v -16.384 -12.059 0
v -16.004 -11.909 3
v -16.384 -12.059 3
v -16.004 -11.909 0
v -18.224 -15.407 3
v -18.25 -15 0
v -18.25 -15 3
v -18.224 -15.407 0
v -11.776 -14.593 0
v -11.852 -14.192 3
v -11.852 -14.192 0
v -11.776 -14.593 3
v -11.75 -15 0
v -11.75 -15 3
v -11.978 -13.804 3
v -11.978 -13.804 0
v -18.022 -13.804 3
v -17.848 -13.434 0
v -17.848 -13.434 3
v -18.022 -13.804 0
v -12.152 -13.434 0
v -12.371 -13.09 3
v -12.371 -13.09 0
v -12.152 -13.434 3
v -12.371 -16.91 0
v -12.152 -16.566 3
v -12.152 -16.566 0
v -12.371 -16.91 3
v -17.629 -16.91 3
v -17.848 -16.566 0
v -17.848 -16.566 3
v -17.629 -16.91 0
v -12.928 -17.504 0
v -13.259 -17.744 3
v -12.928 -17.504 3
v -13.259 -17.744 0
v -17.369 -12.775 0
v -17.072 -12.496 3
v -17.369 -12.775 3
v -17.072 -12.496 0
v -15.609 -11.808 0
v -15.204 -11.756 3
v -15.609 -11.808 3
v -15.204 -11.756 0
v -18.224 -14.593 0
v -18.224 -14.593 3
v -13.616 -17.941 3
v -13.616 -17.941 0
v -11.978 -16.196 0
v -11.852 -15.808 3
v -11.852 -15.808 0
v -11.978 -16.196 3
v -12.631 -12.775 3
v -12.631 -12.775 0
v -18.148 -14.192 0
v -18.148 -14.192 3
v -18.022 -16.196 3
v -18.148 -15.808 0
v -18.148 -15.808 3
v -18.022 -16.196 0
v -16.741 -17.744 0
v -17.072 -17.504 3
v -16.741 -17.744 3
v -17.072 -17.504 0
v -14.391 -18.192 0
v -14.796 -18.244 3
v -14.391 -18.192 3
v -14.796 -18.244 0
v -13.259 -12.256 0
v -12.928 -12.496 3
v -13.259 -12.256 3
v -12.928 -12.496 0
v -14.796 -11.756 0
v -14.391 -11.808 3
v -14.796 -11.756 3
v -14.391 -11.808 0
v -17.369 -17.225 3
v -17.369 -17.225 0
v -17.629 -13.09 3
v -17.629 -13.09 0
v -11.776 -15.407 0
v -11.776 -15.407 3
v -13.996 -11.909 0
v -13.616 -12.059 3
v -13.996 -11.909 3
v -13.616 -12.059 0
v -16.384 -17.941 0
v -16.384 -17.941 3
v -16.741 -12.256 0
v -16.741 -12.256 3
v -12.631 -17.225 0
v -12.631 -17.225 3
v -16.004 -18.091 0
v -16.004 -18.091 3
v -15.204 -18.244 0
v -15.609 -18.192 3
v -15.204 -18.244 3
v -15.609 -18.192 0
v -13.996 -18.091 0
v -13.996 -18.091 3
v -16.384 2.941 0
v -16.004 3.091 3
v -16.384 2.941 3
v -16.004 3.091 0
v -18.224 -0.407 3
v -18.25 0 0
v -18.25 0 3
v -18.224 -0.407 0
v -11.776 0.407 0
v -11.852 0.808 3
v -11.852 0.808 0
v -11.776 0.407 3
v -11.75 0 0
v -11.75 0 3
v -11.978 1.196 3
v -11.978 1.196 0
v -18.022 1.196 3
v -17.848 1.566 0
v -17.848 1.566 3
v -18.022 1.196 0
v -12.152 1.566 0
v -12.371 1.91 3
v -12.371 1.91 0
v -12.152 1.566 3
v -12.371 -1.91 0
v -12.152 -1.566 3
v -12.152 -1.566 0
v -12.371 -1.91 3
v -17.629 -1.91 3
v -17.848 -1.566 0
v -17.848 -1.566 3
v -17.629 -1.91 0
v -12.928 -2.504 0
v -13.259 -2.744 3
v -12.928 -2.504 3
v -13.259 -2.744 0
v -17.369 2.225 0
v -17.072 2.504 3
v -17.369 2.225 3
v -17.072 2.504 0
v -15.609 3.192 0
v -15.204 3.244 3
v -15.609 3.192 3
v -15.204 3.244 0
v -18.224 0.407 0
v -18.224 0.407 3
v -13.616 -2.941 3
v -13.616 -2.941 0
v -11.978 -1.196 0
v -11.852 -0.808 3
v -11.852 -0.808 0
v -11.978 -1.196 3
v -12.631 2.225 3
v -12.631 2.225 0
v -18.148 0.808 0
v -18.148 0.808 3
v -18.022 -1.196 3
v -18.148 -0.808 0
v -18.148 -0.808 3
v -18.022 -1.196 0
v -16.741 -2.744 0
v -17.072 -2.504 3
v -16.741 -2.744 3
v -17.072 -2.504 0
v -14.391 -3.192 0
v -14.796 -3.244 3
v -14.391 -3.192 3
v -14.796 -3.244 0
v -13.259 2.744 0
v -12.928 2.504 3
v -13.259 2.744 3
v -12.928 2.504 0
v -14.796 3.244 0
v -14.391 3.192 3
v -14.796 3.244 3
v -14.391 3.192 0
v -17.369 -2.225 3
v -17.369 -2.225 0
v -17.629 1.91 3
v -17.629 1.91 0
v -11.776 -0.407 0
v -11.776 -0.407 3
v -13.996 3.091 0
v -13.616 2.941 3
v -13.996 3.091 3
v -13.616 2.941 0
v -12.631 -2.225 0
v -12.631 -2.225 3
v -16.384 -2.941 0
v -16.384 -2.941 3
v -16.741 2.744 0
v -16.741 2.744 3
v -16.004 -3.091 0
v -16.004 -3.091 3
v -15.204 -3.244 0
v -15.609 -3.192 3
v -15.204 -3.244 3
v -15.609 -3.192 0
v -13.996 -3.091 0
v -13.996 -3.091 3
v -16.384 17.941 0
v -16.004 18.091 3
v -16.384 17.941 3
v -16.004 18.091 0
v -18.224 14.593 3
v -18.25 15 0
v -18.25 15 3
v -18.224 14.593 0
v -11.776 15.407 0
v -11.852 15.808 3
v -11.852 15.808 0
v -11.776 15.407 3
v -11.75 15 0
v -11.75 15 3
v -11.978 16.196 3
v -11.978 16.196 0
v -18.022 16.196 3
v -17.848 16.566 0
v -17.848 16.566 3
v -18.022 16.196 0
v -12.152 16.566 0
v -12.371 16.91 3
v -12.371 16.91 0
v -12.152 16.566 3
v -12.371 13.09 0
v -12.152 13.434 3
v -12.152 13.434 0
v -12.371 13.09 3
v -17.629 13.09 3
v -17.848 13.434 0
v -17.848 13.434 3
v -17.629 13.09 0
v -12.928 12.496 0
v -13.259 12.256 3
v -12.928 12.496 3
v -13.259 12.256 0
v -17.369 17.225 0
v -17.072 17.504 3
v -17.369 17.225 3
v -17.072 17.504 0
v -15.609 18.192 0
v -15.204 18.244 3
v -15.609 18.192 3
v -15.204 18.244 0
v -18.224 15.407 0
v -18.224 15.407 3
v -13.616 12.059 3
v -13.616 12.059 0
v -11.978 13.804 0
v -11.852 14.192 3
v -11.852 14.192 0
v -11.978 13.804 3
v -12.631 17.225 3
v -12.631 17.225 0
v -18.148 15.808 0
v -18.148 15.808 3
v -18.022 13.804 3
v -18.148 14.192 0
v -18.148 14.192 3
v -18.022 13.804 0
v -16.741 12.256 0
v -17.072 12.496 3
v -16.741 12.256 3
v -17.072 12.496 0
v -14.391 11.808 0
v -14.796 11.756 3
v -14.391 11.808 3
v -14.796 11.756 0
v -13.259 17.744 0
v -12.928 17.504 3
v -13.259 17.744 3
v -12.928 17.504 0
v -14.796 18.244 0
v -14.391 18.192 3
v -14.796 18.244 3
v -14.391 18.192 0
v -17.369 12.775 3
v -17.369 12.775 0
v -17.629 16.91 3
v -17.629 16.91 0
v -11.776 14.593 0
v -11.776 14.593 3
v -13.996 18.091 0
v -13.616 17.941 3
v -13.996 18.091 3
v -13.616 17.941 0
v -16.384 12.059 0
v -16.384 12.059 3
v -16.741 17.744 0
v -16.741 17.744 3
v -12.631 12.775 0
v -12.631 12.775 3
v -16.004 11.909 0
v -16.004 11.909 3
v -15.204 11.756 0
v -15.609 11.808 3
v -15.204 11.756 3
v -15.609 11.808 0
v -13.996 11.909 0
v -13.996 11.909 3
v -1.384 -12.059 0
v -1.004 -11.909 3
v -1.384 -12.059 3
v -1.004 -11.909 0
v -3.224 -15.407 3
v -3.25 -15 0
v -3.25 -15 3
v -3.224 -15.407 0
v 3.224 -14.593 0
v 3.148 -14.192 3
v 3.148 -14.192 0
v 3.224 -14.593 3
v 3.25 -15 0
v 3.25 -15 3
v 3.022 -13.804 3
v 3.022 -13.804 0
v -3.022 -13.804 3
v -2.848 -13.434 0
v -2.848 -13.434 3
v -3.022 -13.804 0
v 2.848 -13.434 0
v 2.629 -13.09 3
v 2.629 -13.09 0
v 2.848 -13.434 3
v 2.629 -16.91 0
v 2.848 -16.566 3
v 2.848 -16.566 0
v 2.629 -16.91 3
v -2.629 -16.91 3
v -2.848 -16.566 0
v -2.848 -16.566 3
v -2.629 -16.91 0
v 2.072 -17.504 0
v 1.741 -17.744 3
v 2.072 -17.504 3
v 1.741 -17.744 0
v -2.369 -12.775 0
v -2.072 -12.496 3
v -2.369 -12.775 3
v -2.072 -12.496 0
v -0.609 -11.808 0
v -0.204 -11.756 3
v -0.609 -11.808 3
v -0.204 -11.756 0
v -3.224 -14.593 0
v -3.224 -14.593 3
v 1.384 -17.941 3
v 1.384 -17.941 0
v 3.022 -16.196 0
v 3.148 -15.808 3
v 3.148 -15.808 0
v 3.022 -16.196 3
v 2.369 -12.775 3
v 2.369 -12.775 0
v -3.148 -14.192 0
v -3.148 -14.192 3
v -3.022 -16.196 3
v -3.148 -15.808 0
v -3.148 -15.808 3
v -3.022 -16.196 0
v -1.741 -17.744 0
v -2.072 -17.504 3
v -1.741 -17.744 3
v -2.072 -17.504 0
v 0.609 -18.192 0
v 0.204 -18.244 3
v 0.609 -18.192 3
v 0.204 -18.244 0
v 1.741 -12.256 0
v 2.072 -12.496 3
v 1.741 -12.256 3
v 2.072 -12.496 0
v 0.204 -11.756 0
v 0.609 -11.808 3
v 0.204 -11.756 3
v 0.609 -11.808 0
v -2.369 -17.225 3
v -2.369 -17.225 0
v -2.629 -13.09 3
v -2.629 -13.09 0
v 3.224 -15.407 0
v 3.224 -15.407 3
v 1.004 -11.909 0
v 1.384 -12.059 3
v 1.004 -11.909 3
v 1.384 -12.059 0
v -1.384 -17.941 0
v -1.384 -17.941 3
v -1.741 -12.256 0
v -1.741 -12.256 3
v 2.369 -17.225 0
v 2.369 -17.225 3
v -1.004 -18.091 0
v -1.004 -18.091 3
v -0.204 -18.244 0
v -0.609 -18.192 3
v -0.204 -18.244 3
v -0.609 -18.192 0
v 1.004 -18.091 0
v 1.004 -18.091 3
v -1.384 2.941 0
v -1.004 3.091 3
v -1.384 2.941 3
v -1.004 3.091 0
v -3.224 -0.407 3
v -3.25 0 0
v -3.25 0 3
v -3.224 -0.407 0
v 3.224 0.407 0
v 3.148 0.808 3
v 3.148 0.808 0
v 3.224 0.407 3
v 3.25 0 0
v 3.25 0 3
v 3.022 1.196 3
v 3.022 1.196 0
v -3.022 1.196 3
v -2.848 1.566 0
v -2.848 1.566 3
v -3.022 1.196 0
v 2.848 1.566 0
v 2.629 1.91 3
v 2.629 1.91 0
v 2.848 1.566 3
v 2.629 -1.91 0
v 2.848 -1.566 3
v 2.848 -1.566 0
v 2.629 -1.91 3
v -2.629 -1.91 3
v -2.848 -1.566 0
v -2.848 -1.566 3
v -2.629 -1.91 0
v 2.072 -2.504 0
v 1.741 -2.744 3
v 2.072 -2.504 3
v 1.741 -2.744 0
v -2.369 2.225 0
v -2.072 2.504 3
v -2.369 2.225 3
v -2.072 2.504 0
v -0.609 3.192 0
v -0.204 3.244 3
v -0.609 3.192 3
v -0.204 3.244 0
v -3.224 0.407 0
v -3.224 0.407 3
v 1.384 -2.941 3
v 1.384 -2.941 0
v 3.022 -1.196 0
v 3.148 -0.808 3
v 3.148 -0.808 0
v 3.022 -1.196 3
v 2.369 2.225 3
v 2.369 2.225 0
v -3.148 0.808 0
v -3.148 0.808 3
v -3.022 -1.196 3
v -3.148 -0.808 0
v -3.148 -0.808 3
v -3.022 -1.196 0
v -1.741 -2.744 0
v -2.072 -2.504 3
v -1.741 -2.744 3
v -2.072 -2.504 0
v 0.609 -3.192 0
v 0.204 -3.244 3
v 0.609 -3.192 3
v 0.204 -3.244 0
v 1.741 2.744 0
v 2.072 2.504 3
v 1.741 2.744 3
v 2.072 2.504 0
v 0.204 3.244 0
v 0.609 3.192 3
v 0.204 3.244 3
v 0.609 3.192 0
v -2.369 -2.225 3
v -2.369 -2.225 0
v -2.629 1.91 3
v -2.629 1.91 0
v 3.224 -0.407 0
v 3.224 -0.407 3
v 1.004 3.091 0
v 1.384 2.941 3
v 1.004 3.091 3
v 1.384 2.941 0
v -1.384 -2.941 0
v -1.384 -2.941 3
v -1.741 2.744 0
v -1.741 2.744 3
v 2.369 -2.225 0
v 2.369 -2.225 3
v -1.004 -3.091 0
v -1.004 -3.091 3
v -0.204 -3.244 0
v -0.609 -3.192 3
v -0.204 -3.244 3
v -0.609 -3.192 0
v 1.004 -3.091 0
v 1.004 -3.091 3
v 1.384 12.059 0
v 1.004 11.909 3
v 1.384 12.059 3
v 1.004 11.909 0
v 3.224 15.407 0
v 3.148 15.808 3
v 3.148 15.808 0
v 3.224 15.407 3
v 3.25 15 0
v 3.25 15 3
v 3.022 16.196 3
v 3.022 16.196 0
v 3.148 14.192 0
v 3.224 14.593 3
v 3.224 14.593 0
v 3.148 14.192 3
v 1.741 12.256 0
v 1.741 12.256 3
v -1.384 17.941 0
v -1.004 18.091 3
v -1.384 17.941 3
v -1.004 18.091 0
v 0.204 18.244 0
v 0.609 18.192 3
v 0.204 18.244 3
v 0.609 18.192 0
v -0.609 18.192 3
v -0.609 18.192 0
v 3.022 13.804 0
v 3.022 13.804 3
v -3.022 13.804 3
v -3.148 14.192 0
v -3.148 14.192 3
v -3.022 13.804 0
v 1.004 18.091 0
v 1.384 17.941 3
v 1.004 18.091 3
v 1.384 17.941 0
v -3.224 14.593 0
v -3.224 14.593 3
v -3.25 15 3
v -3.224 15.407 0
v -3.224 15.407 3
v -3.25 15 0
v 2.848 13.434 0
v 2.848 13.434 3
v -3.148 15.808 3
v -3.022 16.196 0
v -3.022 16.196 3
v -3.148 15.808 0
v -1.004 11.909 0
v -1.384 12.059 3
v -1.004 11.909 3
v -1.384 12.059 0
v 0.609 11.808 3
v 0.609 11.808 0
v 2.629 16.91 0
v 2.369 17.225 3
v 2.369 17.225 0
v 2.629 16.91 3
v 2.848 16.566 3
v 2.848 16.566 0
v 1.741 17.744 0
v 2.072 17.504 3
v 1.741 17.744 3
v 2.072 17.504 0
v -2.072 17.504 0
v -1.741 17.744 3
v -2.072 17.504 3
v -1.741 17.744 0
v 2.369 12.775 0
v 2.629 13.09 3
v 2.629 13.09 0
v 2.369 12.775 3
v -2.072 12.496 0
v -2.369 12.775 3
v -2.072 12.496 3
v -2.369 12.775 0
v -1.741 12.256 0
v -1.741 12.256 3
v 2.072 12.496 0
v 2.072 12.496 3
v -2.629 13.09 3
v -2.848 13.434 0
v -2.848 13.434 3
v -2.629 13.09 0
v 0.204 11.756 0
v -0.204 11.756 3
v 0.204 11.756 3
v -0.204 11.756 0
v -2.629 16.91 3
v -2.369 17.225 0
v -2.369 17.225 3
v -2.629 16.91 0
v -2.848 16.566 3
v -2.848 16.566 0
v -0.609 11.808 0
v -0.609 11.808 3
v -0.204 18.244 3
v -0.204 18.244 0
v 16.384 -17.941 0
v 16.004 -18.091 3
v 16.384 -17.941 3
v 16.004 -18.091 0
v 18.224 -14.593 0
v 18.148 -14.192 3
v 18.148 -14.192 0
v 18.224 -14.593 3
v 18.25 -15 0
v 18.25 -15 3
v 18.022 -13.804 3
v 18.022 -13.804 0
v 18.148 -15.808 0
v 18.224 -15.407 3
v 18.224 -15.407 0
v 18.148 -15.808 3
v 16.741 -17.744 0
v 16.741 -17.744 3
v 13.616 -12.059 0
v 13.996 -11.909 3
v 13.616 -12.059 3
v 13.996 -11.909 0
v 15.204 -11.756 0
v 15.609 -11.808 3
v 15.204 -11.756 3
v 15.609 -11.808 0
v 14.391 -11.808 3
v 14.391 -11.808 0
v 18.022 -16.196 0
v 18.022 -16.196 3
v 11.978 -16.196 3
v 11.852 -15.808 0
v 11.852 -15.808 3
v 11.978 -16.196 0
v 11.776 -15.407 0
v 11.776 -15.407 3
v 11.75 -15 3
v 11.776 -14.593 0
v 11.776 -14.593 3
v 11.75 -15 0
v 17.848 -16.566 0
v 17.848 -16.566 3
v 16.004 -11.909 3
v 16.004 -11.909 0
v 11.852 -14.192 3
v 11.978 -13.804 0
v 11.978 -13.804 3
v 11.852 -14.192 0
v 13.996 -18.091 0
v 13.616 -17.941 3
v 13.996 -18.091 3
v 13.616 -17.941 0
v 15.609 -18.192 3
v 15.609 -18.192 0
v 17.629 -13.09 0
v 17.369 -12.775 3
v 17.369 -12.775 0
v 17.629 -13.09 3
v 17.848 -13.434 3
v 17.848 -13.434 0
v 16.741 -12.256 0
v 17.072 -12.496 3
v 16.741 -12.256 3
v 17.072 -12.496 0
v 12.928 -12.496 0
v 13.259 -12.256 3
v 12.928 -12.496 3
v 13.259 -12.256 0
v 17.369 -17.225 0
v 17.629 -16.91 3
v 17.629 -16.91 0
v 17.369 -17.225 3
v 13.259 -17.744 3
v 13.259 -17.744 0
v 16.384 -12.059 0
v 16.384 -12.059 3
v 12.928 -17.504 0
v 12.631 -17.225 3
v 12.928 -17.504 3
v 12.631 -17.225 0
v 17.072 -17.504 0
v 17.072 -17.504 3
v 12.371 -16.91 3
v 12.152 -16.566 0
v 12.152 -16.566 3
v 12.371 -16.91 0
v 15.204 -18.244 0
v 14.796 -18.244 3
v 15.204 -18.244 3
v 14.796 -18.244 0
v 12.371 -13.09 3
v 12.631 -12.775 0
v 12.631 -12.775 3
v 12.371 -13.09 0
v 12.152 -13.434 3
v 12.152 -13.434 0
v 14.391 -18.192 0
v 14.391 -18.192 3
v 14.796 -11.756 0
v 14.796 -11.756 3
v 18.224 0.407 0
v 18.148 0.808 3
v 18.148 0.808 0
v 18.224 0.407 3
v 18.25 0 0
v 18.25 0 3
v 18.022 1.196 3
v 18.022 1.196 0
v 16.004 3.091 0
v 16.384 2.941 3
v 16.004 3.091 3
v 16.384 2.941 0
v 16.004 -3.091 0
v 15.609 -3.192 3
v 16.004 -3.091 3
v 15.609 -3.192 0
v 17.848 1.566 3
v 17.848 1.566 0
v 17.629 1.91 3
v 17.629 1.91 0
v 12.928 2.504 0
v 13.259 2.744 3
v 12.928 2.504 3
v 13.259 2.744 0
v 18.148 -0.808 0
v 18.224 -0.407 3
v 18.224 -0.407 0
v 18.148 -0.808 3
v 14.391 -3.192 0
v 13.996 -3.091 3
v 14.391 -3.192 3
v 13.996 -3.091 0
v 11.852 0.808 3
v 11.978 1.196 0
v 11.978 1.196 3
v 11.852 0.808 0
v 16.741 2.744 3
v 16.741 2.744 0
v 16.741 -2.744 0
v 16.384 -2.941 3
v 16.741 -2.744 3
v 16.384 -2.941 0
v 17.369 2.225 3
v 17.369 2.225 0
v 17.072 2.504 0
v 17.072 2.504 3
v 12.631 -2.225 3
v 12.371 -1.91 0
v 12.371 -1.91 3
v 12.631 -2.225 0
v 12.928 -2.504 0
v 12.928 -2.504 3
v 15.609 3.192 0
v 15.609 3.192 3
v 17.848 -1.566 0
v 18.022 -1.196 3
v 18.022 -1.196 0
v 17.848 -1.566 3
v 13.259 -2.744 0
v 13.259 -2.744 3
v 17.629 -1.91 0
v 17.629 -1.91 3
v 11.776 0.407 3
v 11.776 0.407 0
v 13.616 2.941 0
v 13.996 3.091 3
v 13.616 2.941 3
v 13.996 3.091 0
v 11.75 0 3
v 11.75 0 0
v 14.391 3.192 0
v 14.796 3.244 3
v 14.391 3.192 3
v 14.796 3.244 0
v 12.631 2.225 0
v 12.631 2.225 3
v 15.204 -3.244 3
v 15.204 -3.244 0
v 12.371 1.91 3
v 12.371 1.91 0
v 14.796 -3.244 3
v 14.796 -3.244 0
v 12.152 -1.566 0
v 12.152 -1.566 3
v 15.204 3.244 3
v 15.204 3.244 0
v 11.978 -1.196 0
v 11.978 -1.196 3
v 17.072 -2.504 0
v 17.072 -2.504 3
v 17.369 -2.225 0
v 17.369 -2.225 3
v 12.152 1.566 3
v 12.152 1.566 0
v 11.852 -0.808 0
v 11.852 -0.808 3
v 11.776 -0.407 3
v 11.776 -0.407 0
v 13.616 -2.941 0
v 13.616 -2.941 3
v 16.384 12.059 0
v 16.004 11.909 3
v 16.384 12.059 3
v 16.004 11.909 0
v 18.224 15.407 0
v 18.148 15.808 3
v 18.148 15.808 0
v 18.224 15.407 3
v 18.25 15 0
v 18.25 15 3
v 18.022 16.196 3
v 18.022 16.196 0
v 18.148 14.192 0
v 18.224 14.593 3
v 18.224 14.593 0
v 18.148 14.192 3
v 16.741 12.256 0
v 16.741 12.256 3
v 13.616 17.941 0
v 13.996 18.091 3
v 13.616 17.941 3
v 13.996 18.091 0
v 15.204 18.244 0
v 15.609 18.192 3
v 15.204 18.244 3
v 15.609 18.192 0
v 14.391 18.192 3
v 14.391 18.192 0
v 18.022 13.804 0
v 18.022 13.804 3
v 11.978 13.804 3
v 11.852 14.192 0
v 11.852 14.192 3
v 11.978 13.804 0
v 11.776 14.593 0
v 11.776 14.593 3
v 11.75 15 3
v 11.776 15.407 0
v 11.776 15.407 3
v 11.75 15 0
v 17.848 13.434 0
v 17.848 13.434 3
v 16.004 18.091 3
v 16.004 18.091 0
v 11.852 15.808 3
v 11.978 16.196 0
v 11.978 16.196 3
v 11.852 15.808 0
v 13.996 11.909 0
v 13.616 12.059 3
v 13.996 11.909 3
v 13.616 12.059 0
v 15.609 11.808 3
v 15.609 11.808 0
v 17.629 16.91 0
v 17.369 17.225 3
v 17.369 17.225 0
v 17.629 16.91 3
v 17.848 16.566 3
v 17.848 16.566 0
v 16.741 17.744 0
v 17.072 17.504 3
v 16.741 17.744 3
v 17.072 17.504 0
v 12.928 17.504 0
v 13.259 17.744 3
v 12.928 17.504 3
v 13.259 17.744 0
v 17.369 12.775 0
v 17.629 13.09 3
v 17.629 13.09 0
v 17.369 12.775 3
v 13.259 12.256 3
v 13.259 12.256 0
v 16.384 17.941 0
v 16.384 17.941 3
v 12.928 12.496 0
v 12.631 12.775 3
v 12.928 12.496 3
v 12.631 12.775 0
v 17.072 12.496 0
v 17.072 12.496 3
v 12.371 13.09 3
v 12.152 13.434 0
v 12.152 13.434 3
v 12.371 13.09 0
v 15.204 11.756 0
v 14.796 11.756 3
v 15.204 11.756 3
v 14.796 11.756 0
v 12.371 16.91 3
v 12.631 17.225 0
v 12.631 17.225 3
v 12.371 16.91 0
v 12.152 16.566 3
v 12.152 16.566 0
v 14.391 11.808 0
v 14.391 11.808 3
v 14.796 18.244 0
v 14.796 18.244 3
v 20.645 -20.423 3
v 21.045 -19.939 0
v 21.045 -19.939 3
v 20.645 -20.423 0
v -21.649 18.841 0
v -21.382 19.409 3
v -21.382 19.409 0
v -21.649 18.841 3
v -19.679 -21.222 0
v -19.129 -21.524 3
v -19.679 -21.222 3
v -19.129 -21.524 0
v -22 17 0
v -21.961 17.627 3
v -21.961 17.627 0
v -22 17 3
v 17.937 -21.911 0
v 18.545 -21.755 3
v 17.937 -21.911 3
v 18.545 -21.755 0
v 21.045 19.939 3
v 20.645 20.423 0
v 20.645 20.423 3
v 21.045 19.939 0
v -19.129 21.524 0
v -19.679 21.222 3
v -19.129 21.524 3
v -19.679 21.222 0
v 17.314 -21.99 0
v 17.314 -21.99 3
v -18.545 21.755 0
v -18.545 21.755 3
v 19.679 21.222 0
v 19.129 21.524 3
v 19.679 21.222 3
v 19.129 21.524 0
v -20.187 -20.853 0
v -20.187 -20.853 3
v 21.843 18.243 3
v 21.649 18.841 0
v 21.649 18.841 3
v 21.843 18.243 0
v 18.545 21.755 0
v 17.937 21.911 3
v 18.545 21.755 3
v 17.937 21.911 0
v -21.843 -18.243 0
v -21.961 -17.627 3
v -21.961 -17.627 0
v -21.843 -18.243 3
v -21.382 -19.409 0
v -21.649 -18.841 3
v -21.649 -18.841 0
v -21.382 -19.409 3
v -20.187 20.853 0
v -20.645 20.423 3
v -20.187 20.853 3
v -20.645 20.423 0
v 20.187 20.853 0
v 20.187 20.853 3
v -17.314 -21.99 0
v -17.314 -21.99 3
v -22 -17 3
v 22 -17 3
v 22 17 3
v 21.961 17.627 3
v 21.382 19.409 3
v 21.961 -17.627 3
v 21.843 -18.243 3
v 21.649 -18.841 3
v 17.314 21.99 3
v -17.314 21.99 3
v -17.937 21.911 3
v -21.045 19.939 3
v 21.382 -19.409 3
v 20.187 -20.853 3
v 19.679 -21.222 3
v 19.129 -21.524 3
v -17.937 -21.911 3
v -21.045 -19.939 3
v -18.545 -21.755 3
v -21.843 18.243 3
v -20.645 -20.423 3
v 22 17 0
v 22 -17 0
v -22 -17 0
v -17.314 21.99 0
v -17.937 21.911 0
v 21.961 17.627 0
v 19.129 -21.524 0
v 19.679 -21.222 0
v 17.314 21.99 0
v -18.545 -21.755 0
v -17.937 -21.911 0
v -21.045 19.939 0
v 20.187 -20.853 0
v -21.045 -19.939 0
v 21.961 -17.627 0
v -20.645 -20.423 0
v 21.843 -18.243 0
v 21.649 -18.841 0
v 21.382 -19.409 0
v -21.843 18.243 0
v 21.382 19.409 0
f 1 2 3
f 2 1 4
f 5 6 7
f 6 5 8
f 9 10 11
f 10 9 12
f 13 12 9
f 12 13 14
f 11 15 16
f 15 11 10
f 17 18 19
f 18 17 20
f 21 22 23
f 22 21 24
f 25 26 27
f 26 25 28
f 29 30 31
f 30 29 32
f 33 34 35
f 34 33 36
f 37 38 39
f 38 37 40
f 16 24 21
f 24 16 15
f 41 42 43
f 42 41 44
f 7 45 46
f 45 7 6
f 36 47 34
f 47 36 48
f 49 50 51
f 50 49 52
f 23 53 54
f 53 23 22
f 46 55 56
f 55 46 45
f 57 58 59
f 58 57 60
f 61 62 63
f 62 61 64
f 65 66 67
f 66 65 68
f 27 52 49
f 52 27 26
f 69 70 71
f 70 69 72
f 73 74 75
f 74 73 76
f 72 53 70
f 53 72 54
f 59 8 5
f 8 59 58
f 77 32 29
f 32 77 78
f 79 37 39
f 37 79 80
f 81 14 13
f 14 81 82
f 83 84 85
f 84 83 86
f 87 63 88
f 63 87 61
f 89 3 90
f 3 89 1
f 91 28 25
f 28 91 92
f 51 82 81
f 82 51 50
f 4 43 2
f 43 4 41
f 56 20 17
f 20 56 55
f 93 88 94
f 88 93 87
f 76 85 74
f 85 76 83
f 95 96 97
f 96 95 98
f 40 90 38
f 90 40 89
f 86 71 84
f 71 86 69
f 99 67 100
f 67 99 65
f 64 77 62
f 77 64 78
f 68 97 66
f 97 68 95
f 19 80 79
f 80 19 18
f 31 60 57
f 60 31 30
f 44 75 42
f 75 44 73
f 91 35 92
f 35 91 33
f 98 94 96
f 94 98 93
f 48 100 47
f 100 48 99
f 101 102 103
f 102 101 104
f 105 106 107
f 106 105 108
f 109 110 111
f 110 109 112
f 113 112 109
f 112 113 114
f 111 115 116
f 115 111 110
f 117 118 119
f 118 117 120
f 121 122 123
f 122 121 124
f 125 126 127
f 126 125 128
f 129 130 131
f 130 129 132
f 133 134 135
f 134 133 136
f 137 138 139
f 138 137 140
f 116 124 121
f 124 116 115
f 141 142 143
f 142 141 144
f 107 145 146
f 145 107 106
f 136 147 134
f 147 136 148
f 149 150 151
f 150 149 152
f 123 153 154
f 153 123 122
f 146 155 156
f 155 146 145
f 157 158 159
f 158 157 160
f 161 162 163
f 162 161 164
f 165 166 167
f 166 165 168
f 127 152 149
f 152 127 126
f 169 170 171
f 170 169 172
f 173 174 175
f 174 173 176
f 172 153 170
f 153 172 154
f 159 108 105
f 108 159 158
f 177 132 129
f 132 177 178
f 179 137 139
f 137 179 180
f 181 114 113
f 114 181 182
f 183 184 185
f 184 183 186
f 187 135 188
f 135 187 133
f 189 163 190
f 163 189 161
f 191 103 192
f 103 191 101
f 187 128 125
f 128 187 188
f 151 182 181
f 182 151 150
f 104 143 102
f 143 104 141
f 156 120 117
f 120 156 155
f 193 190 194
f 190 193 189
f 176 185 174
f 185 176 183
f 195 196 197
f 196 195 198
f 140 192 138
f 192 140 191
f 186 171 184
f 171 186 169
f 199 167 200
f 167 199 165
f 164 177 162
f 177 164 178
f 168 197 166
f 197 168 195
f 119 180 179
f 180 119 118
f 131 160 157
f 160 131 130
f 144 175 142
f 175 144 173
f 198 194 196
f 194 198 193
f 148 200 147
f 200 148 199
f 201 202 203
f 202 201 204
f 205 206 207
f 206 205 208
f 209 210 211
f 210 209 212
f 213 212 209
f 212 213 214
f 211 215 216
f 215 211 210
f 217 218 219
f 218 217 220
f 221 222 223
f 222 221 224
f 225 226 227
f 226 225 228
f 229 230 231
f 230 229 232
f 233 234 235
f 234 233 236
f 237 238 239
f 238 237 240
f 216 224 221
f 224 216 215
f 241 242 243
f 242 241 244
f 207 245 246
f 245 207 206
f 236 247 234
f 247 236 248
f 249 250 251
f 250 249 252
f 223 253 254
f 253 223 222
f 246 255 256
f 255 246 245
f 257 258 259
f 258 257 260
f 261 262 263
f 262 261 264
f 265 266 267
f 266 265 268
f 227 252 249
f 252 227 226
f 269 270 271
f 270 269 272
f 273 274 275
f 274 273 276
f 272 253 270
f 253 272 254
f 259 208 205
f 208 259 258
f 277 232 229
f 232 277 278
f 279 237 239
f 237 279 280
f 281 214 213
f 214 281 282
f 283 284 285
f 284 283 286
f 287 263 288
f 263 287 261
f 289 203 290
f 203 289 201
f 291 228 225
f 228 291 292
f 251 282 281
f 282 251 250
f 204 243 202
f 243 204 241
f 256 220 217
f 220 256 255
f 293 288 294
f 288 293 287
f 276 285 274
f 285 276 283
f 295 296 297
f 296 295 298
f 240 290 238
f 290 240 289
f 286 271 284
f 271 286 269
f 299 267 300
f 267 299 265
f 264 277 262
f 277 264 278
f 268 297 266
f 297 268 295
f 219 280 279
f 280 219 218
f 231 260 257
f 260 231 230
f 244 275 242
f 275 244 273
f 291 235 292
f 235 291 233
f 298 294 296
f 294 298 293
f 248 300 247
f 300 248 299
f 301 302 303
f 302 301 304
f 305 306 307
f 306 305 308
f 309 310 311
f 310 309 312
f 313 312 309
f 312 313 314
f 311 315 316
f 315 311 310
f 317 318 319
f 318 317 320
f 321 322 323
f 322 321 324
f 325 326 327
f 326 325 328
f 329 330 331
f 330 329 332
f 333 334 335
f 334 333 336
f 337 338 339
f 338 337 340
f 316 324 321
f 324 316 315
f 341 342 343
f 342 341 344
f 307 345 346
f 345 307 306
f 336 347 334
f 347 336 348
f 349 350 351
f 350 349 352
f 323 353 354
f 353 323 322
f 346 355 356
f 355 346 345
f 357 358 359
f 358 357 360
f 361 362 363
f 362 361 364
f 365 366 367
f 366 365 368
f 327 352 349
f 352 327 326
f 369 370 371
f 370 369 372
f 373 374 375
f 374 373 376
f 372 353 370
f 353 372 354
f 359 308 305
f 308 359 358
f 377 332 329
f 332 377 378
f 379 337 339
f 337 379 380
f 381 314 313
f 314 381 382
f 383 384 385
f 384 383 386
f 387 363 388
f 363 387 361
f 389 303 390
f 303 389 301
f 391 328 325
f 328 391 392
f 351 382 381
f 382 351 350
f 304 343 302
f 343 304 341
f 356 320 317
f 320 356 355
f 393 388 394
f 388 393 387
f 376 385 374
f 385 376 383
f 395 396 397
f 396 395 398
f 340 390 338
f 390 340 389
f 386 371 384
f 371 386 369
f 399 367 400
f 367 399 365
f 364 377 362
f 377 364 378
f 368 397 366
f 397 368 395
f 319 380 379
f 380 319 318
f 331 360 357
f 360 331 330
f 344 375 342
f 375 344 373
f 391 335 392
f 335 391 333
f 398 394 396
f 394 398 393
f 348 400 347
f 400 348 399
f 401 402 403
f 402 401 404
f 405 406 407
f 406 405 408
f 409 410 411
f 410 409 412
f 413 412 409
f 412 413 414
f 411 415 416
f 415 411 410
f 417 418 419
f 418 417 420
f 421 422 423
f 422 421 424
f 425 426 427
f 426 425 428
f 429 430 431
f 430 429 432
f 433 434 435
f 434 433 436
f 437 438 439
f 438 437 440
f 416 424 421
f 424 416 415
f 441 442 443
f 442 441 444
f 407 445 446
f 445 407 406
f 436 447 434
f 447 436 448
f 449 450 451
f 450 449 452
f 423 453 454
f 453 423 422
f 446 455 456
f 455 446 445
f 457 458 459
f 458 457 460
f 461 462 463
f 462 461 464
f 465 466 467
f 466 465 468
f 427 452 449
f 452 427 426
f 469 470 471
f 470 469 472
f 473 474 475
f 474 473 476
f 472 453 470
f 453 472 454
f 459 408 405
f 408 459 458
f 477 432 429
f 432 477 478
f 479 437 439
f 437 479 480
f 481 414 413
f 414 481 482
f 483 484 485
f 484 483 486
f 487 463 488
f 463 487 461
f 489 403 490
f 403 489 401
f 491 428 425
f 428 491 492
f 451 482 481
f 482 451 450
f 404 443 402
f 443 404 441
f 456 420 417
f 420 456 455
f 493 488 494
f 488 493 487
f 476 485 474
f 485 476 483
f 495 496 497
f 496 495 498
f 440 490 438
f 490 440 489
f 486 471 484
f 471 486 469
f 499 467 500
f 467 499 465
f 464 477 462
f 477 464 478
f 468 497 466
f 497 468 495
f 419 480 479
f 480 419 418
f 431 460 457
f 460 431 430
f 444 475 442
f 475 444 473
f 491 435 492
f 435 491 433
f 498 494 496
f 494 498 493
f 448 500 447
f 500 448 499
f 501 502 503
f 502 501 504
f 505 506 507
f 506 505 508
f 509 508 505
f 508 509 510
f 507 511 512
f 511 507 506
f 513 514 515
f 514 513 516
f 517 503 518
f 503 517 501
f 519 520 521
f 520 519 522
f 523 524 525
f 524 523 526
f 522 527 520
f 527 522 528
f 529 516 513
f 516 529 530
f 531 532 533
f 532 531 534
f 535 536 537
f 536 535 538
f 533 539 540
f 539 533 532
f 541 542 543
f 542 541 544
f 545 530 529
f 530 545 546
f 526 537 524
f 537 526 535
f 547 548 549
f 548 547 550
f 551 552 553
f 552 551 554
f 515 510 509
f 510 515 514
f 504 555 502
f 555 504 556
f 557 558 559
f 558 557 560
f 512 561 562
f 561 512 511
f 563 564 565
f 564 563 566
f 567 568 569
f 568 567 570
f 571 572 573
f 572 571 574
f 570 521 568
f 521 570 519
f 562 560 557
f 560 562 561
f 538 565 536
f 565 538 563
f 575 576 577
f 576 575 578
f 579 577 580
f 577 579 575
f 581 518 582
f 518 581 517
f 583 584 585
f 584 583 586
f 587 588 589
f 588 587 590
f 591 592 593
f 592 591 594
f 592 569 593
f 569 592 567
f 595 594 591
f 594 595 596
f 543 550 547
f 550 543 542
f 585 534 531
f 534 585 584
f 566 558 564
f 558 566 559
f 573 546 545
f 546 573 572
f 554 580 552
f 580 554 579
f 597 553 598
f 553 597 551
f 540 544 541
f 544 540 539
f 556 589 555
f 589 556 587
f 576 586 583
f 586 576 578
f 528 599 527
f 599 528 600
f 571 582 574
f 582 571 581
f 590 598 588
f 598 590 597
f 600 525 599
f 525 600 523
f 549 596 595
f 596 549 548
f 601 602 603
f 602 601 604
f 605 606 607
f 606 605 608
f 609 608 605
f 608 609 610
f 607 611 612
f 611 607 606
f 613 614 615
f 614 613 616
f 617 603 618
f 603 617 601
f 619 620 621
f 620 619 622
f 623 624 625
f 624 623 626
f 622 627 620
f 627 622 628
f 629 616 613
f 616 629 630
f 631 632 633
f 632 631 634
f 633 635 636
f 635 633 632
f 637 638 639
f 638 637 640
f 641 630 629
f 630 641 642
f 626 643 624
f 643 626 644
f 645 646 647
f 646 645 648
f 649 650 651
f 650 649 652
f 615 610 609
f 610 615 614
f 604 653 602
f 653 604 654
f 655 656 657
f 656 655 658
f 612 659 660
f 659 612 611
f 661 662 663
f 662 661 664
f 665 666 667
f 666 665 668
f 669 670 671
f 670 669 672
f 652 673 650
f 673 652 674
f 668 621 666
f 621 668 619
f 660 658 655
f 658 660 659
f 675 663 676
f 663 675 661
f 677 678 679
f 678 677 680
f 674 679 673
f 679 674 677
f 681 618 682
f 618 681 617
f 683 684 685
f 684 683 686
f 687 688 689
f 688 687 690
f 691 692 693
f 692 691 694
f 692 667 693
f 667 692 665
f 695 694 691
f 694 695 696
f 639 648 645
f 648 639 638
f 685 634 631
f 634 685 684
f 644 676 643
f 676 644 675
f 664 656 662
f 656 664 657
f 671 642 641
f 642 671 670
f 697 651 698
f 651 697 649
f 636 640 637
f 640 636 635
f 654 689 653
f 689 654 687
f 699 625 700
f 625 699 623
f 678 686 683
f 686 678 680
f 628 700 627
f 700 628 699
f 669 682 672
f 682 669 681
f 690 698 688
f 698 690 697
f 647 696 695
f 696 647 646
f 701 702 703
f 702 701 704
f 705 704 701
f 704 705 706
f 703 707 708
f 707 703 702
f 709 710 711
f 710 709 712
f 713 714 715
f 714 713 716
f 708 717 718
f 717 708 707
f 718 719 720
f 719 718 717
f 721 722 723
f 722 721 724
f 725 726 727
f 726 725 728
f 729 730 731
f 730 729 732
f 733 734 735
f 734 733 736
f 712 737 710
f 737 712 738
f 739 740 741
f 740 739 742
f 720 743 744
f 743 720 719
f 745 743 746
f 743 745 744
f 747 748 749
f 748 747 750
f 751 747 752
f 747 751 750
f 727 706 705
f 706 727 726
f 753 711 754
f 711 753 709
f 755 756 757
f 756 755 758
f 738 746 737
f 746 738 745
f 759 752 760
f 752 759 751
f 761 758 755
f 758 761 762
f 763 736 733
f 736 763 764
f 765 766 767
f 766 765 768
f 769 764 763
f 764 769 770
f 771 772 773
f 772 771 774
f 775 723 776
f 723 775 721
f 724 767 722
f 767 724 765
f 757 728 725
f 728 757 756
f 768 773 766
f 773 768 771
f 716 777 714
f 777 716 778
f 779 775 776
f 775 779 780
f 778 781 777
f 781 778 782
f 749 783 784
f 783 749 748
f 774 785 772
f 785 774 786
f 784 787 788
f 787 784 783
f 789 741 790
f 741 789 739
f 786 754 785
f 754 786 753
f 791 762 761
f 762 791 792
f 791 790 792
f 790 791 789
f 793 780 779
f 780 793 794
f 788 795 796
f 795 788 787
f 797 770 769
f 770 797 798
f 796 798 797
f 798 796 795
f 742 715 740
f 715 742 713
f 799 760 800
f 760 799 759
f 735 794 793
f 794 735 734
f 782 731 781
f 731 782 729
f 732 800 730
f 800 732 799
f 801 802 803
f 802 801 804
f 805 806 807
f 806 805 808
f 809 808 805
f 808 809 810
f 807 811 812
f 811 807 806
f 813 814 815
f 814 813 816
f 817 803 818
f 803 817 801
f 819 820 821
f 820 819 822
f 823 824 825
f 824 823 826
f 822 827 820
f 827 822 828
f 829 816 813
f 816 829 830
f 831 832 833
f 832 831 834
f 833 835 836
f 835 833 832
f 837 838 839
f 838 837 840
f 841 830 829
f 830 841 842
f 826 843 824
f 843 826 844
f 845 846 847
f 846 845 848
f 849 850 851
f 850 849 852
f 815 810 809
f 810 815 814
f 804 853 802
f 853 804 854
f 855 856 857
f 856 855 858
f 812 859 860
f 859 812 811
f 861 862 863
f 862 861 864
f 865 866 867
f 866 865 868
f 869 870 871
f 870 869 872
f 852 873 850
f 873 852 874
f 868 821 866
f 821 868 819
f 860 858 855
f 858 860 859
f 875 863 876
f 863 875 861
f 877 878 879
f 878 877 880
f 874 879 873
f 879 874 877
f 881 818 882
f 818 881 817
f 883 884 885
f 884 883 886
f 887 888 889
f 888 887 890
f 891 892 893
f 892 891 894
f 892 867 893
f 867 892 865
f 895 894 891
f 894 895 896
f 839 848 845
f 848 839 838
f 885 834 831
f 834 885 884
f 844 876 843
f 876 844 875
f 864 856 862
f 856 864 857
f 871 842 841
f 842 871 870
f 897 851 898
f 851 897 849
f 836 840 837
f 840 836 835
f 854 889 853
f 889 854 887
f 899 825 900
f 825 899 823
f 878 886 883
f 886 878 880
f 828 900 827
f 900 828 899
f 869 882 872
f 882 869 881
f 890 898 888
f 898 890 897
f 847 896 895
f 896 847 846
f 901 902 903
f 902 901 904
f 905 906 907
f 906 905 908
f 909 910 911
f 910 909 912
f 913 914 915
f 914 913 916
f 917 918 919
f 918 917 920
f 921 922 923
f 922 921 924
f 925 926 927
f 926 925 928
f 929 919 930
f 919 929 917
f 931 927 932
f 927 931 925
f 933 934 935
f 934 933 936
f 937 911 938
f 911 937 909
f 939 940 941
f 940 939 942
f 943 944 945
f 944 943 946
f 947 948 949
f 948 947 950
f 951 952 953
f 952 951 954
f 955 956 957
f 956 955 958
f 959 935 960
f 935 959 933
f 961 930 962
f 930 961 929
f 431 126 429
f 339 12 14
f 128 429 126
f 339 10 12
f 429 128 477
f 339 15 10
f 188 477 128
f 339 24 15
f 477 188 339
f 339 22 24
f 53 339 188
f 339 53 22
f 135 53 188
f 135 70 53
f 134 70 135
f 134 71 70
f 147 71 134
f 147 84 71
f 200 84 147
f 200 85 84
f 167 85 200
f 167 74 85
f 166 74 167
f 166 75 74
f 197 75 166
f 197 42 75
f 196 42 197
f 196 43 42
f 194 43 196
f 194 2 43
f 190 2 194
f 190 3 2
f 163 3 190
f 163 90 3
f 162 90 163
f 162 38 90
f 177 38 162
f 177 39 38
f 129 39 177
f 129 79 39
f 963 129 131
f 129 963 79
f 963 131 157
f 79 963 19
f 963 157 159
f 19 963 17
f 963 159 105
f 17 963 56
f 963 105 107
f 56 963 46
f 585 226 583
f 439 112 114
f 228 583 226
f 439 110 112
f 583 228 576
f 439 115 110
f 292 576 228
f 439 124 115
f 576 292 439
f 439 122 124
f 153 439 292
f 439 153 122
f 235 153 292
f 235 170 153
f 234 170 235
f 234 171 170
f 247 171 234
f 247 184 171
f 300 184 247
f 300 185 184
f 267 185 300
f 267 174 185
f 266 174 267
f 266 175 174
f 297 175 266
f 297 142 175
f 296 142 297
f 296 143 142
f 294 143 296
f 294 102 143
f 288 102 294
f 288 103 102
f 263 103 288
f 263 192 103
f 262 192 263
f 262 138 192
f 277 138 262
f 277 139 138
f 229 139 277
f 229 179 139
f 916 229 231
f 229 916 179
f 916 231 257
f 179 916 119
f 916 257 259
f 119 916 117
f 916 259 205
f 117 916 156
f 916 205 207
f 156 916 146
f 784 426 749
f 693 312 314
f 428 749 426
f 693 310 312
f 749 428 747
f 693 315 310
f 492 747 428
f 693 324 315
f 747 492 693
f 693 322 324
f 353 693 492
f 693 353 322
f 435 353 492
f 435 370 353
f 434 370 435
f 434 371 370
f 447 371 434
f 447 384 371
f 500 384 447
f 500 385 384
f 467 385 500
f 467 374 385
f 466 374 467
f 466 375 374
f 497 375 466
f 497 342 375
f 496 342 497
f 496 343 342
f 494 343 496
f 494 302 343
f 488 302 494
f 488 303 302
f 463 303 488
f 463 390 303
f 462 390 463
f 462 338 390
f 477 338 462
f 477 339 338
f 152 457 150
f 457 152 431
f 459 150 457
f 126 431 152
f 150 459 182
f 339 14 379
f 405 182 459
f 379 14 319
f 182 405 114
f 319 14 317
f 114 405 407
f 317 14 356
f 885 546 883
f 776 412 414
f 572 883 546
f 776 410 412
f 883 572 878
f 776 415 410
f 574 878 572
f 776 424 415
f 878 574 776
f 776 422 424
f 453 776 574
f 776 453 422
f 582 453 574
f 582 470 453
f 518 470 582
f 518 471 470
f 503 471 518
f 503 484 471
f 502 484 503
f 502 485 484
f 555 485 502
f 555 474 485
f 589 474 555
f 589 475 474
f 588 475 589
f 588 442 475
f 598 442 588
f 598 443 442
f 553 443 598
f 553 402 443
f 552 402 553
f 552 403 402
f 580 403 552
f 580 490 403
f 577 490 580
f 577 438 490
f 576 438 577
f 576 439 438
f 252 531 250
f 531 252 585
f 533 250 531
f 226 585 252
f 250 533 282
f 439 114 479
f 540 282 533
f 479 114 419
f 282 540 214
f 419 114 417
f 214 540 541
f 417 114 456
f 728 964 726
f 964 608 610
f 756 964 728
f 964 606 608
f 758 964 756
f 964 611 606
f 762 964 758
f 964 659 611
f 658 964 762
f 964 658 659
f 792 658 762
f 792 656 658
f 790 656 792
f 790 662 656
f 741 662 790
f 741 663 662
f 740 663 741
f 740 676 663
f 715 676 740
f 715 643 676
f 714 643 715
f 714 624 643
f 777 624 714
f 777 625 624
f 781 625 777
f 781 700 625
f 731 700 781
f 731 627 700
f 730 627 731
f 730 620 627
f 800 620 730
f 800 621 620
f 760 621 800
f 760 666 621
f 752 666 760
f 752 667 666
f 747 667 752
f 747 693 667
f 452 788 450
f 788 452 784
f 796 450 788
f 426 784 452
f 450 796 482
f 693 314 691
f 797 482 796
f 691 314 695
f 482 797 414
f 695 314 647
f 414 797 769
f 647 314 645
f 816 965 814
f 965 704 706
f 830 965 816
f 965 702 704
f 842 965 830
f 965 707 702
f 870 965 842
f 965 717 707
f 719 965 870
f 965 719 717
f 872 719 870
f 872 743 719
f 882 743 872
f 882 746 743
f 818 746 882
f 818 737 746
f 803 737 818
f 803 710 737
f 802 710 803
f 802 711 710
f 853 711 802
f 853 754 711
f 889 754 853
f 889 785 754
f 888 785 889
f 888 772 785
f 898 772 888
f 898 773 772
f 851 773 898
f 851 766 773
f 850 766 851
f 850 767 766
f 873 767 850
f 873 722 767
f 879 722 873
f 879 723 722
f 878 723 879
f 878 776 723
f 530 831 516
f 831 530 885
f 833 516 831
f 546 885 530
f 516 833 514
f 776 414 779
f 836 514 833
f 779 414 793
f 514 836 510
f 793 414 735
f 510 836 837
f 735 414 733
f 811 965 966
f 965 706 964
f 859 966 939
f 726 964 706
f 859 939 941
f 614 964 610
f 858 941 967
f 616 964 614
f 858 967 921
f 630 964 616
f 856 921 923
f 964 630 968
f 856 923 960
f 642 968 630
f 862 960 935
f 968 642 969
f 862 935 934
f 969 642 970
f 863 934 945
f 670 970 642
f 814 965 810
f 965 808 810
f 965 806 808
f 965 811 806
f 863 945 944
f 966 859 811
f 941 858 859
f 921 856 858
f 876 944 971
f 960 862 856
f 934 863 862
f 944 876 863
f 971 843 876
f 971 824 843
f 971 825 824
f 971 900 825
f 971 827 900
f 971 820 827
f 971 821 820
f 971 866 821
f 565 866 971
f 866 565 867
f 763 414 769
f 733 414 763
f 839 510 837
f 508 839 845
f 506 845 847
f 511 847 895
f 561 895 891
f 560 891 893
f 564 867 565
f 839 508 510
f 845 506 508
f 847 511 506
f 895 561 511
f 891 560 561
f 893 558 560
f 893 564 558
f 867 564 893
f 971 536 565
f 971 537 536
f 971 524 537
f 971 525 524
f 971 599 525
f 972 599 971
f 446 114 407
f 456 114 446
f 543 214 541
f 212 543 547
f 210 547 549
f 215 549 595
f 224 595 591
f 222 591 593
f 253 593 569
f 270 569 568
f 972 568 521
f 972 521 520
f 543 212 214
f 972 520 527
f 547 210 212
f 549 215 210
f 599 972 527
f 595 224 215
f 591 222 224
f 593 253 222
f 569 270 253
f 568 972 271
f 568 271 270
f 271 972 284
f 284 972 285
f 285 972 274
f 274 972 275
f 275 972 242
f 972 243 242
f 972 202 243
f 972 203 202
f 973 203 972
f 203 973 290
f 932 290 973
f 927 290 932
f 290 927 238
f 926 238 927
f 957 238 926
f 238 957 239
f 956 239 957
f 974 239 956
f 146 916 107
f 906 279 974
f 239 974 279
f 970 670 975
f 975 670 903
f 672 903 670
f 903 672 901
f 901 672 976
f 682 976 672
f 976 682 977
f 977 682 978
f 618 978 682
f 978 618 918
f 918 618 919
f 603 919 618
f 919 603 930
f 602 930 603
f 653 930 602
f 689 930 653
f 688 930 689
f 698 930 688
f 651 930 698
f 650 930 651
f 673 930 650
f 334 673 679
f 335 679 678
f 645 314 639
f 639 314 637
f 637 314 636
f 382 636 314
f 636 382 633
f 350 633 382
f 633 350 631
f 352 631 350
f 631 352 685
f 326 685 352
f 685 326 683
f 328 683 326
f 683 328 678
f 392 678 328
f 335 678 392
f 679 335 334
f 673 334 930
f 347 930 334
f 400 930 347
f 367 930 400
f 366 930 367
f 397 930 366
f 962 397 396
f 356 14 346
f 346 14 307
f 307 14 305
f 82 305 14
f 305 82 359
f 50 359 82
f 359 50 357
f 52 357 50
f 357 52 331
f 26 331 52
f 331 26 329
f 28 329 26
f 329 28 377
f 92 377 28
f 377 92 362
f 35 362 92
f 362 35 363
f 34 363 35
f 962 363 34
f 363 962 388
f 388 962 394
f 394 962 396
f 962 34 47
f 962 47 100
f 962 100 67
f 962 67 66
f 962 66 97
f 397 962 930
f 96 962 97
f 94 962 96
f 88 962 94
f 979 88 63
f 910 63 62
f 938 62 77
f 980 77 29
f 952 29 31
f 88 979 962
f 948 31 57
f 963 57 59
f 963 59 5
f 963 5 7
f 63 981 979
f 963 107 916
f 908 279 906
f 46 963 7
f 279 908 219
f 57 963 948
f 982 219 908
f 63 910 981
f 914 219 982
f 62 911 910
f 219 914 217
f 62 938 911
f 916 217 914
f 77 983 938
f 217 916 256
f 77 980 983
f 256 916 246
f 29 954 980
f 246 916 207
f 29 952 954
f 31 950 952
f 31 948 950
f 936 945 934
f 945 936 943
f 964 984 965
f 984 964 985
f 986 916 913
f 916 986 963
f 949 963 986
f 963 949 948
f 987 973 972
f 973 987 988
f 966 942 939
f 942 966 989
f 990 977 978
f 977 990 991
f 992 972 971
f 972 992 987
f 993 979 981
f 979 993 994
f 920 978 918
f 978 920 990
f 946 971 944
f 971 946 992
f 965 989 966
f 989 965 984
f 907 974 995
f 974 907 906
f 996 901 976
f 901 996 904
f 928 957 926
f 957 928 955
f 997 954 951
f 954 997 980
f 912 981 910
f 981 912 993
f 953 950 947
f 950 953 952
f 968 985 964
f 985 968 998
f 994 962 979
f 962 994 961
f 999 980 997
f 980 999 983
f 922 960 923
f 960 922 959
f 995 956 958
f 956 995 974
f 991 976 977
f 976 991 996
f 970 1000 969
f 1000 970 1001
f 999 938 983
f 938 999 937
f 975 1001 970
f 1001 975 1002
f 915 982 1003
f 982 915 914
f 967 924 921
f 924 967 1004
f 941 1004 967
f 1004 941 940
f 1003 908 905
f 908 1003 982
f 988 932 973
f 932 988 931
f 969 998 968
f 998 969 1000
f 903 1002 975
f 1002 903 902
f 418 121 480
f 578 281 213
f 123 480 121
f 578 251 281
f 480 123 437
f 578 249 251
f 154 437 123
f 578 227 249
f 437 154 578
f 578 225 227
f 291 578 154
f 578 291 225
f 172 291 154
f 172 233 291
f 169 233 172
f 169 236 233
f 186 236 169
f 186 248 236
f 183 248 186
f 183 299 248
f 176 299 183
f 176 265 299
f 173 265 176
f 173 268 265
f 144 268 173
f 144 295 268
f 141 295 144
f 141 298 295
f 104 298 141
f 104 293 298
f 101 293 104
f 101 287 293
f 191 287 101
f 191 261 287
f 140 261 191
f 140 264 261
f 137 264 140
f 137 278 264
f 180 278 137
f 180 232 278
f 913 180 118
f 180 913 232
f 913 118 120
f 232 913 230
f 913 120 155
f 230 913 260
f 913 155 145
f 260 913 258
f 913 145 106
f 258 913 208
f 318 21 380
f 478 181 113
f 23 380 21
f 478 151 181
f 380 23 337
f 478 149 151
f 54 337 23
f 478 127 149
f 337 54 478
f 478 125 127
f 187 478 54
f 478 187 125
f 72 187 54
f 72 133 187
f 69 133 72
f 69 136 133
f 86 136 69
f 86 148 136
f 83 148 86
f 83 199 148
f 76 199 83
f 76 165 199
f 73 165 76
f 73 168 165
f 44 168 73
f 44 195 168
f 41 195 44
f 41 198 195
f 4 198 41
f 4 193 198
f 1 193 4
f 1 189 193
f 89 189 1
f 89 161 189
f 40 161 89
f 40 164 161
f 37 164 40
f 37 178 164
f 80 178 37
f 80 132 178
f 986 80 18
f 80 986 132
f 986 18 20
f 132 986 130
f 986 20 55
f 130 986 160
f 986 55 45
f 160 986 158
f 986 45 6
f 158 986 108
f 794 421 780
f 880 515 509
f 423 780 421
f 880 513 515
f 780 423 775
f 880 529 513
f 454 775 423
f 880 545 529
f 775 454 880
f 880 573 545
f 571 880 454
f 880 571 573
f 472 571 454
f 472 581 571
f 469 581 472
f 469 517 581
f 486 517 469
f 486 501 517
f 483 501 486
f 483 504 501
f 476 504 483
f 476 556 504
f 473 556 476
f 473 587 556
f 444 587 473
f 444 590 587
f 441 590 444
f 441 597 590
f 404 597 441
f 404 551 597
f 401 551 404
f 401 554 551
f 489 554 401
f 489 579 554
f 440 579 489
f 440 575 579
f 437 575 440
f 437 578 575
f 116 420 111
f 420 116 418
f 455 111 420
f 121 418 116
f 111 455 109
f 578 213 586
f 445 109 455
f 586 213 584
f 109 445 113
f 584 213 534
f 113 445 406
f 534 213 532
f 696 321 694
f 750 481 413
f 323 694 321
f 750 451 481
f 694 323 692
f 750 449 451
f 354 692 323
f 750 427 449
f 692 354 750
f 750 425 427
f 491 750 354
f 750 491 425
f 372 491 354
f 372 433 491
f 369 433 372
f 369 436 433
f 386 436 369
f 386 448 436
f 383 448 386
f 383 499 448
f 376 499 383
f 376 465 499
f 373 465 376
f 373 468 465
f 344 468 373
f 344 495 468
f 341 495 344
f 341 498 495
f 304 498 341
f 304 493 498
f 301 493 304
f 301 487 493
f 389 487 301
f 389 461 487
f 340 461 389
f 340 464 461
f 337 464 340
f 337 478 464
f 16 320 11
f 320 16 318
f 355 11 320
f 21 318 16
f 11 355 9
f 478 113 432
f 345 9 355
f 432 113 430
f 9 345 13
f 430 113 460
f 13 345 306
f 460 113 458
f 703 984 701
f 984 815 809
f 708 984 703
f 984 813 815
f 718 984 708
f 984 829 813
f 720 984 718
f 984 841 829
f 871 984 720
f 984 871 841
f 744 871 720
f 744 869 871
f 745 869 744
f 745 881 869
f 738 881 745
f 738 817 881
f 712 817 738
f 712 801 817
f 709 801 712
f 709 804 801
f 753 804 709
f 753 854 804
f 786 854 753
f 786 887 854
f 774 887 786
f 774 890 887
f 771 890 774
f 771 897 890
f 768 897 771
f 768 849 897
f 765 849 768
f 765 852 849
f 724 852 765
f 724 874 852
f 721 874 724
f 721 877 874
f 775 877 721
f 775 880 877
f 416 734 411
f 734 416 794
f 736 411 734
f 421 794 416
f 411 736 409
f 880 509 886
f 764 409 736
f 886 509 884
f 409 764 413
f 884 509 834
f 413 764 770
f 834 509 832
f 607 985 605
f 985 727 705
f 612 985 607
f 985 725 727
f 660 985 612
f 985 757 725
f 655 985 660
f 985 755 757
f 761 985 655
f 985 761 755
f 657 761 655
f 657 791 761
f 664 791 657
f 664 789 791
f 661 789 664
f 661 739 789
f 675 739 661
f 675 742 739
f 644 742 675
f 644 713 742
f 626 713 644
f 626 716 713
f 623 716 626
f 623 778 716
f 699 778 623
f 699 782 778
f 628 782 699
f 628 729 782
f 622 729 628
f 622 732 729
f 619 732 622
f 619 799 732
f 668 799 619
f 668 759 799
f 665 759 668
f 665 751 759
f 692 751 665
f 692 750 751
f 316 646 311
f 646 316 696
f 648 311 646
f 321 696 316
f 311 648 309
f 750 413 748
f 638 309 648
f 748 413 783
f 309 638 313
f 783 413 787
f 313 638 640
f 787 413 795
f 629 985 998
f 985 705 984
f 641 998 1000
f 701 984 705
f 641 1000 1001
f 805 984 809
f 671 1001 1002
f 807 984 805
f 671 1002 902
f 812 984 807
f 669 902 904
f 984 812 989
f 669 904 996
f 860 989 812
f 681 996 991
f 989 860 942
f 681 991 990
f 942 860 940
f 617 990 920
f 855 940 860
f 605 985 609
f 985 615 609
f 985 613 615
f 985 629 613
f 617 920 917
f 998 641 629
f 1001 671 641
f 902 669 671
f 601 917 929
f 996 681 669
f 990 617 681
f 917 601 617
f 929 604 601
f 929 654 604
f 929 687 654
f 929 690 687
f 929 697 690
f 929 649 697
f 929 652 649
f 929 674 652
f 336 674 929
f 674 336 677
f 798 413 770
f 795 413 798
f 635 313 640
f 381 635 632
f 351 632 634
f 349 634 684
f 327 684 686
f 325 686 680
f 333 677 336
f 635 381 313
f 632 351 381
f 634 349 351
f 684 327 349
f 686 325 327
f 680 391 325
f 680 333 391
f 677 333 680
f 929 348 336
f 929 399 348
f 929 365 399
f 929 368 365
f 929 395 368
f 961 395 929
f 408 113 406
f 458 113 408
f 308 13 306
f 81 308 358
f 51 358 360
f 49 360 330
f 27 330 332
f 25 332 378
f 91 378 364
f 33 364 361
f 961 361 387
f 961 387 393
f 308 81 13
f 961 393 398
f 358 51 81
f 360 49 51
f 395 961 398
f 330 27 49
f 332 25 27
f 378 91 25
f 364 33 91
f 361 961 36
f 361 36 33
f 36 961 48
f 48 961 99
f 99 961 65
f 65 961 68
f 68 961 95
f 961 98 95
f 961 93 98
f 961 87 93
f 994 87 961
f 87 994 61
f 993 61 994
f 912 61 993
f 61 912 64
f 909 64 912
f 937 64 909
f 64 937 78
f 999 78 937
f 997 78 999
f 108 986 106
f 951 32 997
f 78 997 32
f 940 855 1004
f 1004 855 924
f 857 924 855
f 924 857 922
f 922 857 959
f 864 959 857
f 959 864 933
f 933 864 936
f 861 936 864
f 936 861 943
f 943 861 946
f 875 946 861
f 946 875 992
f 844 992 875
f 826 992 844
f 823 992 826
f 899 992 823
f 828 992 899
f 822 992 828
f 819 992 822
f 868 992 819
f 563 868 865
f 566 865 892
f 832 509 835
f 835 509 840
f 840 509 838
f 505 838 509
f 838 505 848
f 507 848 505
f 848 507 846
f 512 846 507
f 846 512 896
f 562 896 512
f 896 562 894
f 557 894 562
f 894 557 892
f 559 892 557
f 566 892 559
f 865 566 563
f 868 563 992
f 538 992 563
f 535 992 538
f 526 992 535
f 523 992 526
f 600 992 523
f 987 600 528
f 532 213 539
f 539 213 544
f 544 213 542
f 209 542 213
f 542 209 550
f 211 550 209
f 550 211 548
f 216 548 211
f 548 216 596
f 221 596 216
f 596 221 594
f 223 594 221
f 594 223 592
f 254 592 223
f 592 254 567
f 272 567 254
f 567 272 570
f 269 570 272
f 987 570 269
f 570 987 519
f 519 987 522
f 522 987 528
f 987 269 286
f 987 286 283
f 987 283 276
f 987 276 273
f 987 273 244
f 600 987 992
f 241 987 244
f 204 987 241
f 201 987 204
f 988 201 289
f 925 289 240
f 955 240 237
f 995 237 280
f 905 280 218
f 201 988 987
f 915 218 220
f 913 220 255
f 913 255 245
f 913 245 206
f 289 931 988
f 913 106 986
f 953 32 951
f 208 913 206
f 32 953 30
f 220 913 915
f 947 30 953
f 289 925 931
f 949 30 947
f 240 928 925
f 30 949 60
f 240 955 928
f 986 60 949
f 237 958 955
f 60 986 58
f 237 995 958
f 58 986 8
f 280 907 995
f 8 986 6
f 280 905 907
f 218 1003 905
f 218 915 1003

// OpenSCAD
$fn = 50;


difference() {
	union() {
		translate(v = [0, 0, 0]) {
			rotate(a = [0, 0, 0]) {
				hull() {
					translate(v = [-17.0000000000, 17.0000000000, 0]) {
						rotate(a = [0, 0, 0]) {
							translate(v = [0, 0, 0]) {
								rotate(a = [0, 0, 0]) {
									cylinder(h = 3, r = 5);
								}
							}
						}
					}
					translate(v = [17.0000000000, 17.0000000000, 0]) {
						rotate(a = [0, 0, 0]) {
							translate(v = [0, 0, 0]) {
								rotate(a = [0, 0, 0]) {
									cylinder(h = 3, r = 5);
								}
							}
						}
					}
					translate(v = [-17.0000000000, -17.0000000000, 0]) {
						rotate(a = [0, 0, 0]) {
							translate(v = [0, 0, 0]) {
								rotate(a = [0, 0, 0]) {
									cylinder(h = 3, r = 5);
								}
							}
						}
					}
					translate(v = [17.0000000000, -17.0000000000, 0]) {
						rotate(a = [0, 0, 0]) {
							translate(v = [0, 0, 0]) {
								rotate(a = [0, 0, 0]) {
									cylinder(h = 3, r = 5);
								}
							}
						}
					}
				}
			}
		}
	}
	union() {
		translate(v = [-15.0000000000, -15.0000000000, 0]) {
			rotate(a = [0, 0, 0]) {
				translate(v = [0, 0, -50]) {
					rotate(a = [0, 0, 0]) {
						cylinder(h = 100, r = 3.2500000000);
					}
				}
			}
		}
		translate(v = [-15.0000000000, 0.0000000000, 0]) {
			rotate(a = [0, 0, 0]) {
				translate(v = [0, 0, -50]) {
					rotate(a = [0, 0, 0]) {
						cylinder(h = 100, r = 3.2500000000);
					}
				}
			}
		}
		translate(v = [-15.0000000000, 15.0000000000, 0]) {
			rotate(a = [0, 0, 0]) {
				translate(v = [0, 0, -50]) {
					rotate(a = [0, 0, 0]) {
						cylinder(h = 100, r = 3.2500000000);
					}
				}
			}
		}
		translate(v = [0.0000000000, -15.0000000000, 0]) {
			rotate(a = [0, 0, 0]) {
				translate(v = [0, 0, -50]) {
					rotate(a = [0, 0, 0]) {
						cylinder(h = 100, r = 3.2500000000);
					}
				}
			}
		}
		translate(v = [0.0000000000, 0.0000000000, 0]) {
			rotate(a = [0, 0, 0]) {
				translate(v = [0, 0, -50]) {
					rotate(a = [0, 0, 0]) {
						cylinder(h = 100, r = 3.2500000000);
					}
				}
			}
		}
		translate(v = [0.0000000000, 15.0000000000, 0]) {
			rotate(a = [0, 0, 0]) {
				translate(v = [0, 0, -50]) {
					rotate(a = [0, 0, 0]) {
						cylinder(h = 100, r = 3.2500000000);
					}
				}
			}
		}
		translate(v = [15.0000000000, -15.0000000000, 0]) {
			rotate(a = [0, 0, 0]) {
				translate(v = [0, 0, -50]) {
					rotate(a = [0, 0, 0]) {
						cylinder(h = 100, r = 3.2500000000);
					}
				}
			}
		}
		translate(v = [15.0000000000, 0.0000000000, 0]) {
			rotate(a = [0, 0, 0]) {
				translate(v = [0, 0, -50]) {
					rotate(a = [0, 0, 0]) {
						cylinder(h = 100, r = 3.2500000000);
					}
				}
			}
		}
		translate(v = [15.0000000000, 15.0000000000, 0]) {
			rotate(a = [0, 0, 0]) {
				translate(v = [0, 0, -50]) {
					rotate(a = [0, 0, 0]) {
						cylinder(h = 100, r = 3.2500000000);
					}
				}
			}
		}
	}
}
